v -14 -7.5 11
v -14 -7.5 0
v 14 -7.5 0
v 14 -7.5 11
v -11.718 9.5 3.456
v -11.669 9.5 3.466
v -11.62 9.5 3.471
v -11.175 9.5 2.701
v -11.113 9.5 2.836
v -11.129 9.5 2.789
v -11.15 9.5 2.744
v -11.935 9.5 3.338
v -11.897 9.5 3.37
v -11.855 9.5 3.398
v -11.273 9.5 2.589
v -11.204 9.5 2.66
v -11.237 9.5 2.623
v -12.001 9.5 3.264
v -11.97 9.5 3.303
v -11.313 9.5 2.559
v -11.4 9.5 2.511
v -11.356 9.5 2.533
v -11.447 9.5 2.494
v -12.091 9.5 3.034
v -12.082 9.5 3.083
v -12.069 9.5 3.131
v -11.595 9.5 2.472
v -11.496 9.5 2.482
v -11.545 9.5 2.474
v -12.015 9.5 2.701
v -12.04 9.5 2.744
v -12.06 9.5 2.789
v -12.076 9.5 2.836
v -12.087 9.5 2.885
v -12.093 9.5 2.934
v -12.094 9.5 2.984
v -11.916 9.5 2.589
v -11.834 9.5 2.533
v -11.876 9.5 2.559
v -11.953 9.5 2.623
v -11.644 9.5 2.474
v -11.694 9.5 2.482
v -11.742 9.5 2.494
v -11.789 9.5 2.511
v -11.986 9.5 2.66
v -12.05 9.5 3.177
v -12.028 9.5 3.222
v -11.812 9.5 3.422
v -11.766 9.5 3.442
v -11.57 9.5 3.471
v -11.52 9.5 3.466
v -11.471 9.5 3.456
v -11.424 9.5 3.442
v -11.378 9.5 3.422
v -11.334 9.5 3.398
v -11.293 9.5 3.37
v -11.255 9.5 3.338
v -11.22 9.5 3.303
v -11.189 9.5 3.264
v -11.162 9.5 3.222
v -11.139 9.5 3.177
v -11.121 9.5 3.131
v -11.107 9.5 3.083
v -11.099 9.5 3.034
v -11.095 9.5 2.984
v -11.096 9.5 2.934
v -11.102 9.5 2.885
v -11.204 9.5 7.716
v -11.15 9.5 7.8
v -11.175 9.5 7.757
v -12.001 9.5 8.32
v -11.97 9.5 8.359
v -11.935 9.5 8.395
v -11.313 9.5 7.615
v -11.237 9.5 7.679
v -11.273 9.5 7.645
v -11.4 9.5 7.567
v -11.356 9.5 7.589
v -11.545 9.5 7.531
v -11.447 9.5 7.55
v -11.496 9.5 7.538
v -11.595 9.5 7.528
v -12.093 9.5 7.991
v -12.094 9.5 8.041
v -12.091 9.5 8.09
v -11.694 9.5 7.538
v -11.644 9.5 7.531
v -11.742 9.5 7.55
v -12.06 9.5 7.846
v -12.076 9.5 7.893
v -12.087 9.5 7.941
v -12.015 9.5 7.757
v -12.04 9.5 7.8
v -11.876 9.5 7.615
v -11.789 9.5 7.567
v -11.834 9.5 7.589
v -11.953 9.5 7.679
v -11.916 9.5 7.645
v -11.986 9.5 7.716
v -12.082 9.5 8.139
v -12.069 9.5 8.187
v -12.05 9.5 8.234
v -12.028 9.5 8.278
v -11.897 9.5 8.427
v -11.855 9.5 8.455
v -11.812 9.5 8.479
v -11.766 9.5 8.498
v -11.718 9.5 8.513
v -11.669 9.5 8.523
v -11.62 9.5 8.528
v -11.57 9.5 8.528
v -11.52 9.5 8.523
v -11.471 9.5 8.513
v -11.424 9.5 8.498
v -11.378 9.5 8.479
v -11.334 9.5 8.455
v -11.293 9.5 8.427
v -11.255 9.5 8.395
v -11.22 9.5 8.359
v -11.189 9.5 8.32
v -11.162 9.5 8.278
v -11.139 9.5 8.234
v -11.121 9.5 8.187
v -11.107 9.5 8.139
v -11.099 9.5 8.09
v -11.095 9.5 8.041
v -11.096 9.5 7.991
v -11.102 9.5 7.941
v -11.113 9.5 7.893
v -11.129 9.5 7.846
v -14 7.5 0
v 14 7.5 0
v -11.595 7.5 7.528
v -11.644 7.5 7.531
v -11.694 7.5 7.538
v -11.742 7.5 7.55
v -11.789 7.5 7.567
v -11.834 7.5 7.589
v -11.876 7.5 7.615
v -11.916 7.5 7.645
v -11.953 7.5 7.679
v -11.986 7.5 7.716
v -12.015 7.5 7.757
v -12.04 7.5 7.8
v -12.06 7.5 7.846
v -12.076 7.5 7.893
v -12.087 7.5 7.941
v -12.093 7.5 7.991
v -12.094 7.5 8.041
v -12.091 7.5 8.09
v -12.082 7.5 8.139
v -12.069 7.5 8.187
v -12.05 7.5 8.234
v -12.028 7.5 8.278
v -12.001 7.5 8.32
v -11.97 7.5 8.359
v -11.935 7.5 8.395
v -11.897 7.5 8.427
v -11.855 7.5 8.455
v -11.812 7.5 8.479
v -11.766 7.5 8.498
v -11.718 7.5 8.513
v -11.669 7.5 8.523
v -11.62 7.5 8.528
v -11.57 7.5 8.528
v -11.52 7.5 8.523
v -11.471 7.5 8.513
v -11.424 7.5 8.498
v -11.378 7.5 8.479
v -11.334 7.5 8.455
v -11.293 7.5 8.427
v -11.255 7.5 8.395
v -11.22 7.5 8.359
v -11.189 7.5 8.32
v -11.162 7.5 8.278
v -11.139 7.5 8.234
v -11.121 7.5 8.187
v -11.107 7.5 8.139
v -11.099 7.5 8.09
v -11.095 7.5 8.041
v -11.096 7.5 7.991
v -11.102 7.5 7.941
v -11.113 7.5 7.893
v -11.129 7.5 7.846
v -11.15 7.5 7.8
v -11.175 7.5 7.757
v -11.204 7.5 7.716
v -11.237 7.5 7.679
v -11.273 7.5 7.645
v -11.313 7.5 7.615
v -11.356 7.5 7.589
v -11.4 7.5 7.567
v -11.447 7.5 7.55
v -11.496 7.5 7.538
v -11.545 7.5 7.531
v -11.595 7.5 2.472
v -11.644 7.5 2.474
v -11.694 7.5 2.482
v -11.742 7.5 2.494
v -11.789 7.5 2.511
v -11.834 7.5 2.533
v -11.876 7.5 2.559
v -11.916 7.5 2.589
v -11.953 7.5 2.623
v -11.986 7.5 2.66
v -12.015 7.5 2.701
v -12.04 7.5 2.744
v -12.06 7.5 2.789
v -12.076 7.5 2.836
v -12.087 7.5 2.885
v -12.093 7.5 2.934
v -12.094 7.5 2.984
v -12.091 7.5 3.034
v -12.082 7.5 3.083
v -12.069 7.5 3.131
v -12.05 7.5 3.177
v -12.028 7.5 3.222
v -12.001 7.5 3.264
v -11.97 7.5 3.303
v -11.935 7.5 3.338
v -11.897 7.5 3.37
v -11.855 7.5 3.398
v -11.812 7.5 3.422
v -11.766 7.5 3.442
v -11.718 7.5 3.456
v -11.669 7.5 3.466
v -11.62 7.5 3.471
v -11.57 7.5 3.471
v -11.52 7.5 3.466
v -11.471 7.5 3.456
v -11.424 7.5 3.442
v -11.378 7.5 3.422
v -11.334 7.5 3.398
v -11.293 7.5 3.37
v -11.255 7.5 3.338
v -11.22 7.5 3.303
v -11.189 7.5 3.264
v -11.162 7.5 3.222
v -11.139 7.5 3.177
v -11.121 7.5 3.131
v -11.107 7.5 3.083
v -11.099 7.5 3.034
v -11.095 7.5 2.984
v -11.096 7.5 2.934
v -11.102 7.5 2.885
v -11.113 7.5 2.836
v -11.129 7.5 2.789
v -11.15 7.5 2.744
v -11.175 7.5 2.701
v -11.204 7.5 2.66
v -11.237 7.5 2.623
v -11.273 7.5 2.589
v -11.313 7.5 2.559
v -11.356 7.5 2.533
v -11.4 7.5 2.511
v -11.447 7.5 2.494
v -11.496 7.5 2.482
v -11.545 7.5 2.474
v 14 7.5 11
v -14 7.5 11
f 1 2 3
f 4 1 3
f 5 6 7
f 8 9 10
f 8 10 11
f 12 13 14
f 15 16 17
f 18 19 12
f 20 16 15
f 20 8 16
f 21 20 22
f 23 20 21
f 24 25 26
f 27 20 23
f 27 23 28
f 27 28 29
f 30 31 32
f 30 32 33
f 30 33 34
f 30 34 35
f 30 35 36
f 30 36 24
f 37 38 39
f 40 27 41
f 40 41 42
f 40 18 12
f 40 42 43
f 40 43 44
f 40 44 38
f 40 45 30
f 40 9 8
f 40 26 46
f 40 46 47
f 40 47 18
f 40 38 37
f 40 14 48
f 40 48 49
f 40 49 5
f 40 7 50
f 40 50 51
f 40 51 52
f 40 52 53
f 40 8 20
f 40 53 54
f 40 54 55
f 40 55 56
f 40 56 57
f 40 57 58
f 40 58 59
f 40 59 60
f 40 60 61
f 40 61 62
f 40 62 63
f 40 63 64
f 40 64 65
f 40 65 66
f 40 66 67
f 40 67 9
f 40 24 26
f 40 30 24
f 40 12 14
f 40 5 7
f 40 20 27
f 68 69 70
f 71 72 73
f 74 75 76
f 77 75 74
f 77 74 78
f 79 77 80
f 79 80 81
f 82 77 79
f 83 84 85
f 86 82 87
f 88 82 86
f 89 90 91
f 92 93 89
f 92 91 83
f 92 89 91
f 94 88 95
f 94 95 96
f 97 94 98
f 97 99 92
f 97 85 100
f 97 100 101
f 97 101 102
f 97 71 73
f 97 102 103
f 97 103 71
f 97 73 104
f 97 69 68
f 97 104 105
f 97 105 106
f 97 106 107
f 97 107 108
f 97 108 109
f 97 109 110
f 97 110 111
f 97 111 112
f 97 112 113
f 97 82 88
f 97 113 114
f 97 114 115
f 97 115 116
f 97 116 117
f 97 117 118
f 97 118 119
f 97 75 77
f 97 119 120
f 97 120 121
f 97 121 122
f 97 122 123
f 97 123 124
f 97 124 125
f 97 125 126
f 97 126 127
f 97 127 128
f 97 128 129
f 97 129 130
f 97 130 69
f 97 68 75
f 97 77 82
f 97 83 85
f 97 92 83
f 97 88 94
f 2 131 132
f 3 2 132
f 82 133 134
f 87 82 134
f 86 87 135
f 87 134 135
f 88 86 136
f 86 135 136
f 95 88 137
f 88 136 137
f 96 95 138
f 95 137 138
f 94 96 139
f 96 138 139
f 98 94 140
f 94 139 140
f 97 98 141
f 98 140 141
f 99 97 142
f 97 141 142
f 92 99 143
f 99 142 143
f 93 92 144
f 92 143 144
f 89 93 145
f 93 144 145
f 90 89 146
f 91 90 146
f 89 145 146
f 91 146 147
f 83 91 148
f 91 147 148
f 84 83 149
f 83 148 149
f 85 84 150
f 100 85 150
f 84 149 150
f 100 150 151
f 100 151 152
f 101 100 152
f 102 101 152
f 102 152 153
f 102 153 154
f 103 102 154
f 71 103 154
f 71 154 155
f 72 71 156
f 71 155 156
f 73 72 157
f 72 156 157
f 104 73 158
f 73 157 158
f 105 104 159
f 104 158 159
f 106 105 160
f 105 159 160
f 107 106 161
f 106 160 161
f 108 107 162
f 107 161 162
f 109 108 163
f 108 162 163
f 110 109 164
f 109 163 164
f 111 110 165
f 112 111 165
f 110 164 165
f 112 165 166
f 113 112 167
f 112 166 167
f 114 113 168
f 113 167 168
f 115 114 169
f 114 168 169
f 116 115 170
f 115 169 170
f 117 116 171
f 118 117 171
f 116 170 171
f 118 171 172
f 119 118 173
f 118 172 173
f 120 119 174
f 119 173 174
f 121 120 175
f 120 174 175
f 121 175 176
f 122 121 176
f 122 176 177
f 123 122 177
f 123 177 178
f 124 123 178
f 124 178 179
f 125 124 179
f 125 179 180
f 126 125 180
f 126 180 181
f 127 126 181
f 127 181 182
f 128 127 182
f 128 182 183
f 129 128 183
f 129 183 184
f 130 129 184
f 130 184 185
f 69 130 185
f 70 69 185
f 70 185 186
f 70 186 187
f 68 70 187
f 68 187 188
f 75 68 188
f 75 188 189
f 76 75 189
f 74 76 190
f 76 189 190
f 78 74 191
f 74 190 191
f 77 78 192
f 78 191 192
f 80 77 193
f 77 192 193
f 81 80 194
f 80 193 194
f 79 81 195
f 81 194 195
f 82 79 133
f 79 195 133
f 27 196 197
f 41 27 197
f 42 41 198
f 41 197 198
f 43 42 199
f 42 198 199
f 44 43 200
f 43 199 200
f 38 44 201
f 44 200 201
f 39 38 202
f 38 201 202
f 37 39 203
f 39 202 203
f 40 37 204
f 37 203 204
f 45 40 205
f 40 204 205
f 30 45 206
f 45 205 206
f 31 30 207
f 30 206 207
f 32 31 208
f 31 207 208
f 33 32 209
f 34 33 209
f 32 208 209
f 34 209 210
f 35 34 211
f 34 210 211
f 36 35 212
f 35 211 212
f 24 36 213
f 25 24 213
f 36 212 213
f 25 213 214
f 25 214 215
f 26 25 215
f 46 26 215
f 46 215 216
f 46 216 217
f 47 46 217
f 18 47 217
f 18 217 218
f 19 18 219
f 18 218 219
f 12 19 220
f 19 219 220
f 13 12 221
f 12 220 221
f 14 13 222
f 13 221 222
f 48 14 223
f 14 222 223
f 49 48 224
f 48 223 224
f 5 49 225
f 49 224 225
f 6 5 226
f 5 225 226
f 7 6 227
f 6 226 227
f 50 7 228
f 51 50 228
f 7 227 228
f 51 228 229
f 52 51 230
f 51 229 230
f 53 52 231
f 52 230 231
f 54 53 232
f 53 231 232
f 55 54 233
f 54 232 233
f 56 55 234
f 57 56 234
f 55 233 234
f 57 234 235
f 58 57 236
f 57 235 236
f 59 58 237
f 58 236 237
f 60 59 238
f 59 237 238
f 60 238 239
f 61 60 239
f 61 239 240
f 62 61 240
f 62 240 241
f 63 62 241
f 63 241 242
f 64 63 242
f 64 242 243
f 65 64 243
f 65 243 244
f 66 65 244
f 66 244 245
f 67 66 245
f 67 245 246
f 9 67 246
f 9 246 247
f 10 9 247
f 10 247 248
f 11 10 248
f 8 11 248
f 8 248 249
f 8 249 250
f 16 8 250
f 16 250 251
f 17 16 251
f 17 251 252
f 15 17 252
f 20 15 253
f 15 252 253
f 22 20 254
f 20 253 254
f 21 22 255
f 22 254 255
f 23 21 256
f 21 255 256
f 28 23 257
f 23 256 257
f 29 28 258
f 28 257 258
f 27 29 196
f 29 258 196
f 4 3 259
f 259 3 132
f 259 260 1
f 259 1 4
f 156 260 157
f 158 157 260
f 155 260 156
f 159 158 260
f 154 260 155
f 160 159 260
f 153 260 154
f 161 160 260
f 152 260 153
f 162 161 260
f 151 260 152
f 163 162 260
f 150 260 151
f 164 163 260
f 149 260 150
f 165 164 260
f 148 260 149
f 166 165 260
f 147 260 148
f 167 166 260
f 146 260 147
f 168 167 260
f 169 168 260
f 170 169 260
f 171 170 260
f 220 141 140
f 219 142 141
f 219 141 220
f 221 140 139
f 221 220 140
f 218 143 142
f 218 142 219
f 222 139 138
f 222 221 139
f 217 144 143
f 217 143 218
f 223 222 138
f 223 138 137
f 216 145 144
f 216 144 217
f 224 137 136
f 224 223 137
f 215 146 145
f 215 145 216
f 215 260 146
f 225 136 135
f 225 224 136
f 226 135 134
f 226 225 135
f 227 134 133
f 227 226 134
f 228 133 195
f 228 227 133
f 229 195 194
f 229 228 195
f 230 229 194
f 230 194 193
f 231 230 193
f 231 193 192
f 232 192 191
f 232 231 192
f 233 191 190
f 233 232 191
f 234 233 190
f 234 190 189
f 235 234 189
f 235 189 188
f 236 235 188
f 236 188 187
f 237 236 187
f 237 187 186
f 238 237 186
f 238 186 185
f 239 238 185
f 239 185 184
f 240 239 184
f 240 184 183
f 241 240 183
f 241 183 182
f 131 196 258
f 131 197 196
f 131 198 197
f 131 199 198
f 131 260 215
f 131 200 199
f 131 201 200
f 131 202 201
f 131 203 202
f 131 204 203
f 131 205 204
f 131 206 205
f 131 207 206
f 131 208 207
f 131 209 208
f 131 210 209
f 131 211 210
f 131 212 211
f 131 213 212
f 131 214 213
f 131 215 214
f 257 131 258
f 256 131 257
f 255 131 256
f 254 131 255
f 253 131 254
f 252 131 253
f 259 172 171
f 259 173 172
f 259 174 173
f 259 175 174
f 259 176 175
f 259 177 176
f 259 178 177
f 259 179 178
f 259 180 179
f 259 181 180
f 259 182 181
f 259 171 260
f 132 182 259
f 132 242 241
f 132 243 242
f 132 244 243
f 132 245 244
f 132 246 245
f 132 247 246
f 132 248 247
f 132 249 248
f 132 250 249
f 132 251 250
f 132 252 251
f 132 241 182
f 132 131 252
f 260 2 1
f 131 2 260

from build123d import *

# Parameters (mm, degrees)
SKETCH_1_W      = 28
SKETCH_1_H      = 15
EXTRUDE_1_DEPTH = 11
SKETCH_2_R      = 0.5
EXTRUDE_2_DEPTH = 2


with BuildPart() as part:
    # 草图1 → 凸台-拉伸1 (new body)
    with BuildSketch(Plane.XY):
        Rectangle(SKETCH_1_W, SKETCH_1_H)
    extrude(amount=EXTRUDE_1_DEPTH)

    # 草图2 → 凸台-拉伸2 (add)
    with BuildSketch(Plane(origin=(0, 7.5, 0), x_dir=(1, 0, 0), z_dir=(0, 1, 0))):
        with Locations(Location((-11.594640153, -2.971812887, 0), (0, 0, 90))):
            Circle(SKETCH_2_R)
        with Locations(Location((-11.594640153, -8.028187113, 0), (0, 0, 90))):
            Circle(SKETCH_2_R)
    extrude(amount=EXTRUDE_2_DEPTH)


solid = part.part
